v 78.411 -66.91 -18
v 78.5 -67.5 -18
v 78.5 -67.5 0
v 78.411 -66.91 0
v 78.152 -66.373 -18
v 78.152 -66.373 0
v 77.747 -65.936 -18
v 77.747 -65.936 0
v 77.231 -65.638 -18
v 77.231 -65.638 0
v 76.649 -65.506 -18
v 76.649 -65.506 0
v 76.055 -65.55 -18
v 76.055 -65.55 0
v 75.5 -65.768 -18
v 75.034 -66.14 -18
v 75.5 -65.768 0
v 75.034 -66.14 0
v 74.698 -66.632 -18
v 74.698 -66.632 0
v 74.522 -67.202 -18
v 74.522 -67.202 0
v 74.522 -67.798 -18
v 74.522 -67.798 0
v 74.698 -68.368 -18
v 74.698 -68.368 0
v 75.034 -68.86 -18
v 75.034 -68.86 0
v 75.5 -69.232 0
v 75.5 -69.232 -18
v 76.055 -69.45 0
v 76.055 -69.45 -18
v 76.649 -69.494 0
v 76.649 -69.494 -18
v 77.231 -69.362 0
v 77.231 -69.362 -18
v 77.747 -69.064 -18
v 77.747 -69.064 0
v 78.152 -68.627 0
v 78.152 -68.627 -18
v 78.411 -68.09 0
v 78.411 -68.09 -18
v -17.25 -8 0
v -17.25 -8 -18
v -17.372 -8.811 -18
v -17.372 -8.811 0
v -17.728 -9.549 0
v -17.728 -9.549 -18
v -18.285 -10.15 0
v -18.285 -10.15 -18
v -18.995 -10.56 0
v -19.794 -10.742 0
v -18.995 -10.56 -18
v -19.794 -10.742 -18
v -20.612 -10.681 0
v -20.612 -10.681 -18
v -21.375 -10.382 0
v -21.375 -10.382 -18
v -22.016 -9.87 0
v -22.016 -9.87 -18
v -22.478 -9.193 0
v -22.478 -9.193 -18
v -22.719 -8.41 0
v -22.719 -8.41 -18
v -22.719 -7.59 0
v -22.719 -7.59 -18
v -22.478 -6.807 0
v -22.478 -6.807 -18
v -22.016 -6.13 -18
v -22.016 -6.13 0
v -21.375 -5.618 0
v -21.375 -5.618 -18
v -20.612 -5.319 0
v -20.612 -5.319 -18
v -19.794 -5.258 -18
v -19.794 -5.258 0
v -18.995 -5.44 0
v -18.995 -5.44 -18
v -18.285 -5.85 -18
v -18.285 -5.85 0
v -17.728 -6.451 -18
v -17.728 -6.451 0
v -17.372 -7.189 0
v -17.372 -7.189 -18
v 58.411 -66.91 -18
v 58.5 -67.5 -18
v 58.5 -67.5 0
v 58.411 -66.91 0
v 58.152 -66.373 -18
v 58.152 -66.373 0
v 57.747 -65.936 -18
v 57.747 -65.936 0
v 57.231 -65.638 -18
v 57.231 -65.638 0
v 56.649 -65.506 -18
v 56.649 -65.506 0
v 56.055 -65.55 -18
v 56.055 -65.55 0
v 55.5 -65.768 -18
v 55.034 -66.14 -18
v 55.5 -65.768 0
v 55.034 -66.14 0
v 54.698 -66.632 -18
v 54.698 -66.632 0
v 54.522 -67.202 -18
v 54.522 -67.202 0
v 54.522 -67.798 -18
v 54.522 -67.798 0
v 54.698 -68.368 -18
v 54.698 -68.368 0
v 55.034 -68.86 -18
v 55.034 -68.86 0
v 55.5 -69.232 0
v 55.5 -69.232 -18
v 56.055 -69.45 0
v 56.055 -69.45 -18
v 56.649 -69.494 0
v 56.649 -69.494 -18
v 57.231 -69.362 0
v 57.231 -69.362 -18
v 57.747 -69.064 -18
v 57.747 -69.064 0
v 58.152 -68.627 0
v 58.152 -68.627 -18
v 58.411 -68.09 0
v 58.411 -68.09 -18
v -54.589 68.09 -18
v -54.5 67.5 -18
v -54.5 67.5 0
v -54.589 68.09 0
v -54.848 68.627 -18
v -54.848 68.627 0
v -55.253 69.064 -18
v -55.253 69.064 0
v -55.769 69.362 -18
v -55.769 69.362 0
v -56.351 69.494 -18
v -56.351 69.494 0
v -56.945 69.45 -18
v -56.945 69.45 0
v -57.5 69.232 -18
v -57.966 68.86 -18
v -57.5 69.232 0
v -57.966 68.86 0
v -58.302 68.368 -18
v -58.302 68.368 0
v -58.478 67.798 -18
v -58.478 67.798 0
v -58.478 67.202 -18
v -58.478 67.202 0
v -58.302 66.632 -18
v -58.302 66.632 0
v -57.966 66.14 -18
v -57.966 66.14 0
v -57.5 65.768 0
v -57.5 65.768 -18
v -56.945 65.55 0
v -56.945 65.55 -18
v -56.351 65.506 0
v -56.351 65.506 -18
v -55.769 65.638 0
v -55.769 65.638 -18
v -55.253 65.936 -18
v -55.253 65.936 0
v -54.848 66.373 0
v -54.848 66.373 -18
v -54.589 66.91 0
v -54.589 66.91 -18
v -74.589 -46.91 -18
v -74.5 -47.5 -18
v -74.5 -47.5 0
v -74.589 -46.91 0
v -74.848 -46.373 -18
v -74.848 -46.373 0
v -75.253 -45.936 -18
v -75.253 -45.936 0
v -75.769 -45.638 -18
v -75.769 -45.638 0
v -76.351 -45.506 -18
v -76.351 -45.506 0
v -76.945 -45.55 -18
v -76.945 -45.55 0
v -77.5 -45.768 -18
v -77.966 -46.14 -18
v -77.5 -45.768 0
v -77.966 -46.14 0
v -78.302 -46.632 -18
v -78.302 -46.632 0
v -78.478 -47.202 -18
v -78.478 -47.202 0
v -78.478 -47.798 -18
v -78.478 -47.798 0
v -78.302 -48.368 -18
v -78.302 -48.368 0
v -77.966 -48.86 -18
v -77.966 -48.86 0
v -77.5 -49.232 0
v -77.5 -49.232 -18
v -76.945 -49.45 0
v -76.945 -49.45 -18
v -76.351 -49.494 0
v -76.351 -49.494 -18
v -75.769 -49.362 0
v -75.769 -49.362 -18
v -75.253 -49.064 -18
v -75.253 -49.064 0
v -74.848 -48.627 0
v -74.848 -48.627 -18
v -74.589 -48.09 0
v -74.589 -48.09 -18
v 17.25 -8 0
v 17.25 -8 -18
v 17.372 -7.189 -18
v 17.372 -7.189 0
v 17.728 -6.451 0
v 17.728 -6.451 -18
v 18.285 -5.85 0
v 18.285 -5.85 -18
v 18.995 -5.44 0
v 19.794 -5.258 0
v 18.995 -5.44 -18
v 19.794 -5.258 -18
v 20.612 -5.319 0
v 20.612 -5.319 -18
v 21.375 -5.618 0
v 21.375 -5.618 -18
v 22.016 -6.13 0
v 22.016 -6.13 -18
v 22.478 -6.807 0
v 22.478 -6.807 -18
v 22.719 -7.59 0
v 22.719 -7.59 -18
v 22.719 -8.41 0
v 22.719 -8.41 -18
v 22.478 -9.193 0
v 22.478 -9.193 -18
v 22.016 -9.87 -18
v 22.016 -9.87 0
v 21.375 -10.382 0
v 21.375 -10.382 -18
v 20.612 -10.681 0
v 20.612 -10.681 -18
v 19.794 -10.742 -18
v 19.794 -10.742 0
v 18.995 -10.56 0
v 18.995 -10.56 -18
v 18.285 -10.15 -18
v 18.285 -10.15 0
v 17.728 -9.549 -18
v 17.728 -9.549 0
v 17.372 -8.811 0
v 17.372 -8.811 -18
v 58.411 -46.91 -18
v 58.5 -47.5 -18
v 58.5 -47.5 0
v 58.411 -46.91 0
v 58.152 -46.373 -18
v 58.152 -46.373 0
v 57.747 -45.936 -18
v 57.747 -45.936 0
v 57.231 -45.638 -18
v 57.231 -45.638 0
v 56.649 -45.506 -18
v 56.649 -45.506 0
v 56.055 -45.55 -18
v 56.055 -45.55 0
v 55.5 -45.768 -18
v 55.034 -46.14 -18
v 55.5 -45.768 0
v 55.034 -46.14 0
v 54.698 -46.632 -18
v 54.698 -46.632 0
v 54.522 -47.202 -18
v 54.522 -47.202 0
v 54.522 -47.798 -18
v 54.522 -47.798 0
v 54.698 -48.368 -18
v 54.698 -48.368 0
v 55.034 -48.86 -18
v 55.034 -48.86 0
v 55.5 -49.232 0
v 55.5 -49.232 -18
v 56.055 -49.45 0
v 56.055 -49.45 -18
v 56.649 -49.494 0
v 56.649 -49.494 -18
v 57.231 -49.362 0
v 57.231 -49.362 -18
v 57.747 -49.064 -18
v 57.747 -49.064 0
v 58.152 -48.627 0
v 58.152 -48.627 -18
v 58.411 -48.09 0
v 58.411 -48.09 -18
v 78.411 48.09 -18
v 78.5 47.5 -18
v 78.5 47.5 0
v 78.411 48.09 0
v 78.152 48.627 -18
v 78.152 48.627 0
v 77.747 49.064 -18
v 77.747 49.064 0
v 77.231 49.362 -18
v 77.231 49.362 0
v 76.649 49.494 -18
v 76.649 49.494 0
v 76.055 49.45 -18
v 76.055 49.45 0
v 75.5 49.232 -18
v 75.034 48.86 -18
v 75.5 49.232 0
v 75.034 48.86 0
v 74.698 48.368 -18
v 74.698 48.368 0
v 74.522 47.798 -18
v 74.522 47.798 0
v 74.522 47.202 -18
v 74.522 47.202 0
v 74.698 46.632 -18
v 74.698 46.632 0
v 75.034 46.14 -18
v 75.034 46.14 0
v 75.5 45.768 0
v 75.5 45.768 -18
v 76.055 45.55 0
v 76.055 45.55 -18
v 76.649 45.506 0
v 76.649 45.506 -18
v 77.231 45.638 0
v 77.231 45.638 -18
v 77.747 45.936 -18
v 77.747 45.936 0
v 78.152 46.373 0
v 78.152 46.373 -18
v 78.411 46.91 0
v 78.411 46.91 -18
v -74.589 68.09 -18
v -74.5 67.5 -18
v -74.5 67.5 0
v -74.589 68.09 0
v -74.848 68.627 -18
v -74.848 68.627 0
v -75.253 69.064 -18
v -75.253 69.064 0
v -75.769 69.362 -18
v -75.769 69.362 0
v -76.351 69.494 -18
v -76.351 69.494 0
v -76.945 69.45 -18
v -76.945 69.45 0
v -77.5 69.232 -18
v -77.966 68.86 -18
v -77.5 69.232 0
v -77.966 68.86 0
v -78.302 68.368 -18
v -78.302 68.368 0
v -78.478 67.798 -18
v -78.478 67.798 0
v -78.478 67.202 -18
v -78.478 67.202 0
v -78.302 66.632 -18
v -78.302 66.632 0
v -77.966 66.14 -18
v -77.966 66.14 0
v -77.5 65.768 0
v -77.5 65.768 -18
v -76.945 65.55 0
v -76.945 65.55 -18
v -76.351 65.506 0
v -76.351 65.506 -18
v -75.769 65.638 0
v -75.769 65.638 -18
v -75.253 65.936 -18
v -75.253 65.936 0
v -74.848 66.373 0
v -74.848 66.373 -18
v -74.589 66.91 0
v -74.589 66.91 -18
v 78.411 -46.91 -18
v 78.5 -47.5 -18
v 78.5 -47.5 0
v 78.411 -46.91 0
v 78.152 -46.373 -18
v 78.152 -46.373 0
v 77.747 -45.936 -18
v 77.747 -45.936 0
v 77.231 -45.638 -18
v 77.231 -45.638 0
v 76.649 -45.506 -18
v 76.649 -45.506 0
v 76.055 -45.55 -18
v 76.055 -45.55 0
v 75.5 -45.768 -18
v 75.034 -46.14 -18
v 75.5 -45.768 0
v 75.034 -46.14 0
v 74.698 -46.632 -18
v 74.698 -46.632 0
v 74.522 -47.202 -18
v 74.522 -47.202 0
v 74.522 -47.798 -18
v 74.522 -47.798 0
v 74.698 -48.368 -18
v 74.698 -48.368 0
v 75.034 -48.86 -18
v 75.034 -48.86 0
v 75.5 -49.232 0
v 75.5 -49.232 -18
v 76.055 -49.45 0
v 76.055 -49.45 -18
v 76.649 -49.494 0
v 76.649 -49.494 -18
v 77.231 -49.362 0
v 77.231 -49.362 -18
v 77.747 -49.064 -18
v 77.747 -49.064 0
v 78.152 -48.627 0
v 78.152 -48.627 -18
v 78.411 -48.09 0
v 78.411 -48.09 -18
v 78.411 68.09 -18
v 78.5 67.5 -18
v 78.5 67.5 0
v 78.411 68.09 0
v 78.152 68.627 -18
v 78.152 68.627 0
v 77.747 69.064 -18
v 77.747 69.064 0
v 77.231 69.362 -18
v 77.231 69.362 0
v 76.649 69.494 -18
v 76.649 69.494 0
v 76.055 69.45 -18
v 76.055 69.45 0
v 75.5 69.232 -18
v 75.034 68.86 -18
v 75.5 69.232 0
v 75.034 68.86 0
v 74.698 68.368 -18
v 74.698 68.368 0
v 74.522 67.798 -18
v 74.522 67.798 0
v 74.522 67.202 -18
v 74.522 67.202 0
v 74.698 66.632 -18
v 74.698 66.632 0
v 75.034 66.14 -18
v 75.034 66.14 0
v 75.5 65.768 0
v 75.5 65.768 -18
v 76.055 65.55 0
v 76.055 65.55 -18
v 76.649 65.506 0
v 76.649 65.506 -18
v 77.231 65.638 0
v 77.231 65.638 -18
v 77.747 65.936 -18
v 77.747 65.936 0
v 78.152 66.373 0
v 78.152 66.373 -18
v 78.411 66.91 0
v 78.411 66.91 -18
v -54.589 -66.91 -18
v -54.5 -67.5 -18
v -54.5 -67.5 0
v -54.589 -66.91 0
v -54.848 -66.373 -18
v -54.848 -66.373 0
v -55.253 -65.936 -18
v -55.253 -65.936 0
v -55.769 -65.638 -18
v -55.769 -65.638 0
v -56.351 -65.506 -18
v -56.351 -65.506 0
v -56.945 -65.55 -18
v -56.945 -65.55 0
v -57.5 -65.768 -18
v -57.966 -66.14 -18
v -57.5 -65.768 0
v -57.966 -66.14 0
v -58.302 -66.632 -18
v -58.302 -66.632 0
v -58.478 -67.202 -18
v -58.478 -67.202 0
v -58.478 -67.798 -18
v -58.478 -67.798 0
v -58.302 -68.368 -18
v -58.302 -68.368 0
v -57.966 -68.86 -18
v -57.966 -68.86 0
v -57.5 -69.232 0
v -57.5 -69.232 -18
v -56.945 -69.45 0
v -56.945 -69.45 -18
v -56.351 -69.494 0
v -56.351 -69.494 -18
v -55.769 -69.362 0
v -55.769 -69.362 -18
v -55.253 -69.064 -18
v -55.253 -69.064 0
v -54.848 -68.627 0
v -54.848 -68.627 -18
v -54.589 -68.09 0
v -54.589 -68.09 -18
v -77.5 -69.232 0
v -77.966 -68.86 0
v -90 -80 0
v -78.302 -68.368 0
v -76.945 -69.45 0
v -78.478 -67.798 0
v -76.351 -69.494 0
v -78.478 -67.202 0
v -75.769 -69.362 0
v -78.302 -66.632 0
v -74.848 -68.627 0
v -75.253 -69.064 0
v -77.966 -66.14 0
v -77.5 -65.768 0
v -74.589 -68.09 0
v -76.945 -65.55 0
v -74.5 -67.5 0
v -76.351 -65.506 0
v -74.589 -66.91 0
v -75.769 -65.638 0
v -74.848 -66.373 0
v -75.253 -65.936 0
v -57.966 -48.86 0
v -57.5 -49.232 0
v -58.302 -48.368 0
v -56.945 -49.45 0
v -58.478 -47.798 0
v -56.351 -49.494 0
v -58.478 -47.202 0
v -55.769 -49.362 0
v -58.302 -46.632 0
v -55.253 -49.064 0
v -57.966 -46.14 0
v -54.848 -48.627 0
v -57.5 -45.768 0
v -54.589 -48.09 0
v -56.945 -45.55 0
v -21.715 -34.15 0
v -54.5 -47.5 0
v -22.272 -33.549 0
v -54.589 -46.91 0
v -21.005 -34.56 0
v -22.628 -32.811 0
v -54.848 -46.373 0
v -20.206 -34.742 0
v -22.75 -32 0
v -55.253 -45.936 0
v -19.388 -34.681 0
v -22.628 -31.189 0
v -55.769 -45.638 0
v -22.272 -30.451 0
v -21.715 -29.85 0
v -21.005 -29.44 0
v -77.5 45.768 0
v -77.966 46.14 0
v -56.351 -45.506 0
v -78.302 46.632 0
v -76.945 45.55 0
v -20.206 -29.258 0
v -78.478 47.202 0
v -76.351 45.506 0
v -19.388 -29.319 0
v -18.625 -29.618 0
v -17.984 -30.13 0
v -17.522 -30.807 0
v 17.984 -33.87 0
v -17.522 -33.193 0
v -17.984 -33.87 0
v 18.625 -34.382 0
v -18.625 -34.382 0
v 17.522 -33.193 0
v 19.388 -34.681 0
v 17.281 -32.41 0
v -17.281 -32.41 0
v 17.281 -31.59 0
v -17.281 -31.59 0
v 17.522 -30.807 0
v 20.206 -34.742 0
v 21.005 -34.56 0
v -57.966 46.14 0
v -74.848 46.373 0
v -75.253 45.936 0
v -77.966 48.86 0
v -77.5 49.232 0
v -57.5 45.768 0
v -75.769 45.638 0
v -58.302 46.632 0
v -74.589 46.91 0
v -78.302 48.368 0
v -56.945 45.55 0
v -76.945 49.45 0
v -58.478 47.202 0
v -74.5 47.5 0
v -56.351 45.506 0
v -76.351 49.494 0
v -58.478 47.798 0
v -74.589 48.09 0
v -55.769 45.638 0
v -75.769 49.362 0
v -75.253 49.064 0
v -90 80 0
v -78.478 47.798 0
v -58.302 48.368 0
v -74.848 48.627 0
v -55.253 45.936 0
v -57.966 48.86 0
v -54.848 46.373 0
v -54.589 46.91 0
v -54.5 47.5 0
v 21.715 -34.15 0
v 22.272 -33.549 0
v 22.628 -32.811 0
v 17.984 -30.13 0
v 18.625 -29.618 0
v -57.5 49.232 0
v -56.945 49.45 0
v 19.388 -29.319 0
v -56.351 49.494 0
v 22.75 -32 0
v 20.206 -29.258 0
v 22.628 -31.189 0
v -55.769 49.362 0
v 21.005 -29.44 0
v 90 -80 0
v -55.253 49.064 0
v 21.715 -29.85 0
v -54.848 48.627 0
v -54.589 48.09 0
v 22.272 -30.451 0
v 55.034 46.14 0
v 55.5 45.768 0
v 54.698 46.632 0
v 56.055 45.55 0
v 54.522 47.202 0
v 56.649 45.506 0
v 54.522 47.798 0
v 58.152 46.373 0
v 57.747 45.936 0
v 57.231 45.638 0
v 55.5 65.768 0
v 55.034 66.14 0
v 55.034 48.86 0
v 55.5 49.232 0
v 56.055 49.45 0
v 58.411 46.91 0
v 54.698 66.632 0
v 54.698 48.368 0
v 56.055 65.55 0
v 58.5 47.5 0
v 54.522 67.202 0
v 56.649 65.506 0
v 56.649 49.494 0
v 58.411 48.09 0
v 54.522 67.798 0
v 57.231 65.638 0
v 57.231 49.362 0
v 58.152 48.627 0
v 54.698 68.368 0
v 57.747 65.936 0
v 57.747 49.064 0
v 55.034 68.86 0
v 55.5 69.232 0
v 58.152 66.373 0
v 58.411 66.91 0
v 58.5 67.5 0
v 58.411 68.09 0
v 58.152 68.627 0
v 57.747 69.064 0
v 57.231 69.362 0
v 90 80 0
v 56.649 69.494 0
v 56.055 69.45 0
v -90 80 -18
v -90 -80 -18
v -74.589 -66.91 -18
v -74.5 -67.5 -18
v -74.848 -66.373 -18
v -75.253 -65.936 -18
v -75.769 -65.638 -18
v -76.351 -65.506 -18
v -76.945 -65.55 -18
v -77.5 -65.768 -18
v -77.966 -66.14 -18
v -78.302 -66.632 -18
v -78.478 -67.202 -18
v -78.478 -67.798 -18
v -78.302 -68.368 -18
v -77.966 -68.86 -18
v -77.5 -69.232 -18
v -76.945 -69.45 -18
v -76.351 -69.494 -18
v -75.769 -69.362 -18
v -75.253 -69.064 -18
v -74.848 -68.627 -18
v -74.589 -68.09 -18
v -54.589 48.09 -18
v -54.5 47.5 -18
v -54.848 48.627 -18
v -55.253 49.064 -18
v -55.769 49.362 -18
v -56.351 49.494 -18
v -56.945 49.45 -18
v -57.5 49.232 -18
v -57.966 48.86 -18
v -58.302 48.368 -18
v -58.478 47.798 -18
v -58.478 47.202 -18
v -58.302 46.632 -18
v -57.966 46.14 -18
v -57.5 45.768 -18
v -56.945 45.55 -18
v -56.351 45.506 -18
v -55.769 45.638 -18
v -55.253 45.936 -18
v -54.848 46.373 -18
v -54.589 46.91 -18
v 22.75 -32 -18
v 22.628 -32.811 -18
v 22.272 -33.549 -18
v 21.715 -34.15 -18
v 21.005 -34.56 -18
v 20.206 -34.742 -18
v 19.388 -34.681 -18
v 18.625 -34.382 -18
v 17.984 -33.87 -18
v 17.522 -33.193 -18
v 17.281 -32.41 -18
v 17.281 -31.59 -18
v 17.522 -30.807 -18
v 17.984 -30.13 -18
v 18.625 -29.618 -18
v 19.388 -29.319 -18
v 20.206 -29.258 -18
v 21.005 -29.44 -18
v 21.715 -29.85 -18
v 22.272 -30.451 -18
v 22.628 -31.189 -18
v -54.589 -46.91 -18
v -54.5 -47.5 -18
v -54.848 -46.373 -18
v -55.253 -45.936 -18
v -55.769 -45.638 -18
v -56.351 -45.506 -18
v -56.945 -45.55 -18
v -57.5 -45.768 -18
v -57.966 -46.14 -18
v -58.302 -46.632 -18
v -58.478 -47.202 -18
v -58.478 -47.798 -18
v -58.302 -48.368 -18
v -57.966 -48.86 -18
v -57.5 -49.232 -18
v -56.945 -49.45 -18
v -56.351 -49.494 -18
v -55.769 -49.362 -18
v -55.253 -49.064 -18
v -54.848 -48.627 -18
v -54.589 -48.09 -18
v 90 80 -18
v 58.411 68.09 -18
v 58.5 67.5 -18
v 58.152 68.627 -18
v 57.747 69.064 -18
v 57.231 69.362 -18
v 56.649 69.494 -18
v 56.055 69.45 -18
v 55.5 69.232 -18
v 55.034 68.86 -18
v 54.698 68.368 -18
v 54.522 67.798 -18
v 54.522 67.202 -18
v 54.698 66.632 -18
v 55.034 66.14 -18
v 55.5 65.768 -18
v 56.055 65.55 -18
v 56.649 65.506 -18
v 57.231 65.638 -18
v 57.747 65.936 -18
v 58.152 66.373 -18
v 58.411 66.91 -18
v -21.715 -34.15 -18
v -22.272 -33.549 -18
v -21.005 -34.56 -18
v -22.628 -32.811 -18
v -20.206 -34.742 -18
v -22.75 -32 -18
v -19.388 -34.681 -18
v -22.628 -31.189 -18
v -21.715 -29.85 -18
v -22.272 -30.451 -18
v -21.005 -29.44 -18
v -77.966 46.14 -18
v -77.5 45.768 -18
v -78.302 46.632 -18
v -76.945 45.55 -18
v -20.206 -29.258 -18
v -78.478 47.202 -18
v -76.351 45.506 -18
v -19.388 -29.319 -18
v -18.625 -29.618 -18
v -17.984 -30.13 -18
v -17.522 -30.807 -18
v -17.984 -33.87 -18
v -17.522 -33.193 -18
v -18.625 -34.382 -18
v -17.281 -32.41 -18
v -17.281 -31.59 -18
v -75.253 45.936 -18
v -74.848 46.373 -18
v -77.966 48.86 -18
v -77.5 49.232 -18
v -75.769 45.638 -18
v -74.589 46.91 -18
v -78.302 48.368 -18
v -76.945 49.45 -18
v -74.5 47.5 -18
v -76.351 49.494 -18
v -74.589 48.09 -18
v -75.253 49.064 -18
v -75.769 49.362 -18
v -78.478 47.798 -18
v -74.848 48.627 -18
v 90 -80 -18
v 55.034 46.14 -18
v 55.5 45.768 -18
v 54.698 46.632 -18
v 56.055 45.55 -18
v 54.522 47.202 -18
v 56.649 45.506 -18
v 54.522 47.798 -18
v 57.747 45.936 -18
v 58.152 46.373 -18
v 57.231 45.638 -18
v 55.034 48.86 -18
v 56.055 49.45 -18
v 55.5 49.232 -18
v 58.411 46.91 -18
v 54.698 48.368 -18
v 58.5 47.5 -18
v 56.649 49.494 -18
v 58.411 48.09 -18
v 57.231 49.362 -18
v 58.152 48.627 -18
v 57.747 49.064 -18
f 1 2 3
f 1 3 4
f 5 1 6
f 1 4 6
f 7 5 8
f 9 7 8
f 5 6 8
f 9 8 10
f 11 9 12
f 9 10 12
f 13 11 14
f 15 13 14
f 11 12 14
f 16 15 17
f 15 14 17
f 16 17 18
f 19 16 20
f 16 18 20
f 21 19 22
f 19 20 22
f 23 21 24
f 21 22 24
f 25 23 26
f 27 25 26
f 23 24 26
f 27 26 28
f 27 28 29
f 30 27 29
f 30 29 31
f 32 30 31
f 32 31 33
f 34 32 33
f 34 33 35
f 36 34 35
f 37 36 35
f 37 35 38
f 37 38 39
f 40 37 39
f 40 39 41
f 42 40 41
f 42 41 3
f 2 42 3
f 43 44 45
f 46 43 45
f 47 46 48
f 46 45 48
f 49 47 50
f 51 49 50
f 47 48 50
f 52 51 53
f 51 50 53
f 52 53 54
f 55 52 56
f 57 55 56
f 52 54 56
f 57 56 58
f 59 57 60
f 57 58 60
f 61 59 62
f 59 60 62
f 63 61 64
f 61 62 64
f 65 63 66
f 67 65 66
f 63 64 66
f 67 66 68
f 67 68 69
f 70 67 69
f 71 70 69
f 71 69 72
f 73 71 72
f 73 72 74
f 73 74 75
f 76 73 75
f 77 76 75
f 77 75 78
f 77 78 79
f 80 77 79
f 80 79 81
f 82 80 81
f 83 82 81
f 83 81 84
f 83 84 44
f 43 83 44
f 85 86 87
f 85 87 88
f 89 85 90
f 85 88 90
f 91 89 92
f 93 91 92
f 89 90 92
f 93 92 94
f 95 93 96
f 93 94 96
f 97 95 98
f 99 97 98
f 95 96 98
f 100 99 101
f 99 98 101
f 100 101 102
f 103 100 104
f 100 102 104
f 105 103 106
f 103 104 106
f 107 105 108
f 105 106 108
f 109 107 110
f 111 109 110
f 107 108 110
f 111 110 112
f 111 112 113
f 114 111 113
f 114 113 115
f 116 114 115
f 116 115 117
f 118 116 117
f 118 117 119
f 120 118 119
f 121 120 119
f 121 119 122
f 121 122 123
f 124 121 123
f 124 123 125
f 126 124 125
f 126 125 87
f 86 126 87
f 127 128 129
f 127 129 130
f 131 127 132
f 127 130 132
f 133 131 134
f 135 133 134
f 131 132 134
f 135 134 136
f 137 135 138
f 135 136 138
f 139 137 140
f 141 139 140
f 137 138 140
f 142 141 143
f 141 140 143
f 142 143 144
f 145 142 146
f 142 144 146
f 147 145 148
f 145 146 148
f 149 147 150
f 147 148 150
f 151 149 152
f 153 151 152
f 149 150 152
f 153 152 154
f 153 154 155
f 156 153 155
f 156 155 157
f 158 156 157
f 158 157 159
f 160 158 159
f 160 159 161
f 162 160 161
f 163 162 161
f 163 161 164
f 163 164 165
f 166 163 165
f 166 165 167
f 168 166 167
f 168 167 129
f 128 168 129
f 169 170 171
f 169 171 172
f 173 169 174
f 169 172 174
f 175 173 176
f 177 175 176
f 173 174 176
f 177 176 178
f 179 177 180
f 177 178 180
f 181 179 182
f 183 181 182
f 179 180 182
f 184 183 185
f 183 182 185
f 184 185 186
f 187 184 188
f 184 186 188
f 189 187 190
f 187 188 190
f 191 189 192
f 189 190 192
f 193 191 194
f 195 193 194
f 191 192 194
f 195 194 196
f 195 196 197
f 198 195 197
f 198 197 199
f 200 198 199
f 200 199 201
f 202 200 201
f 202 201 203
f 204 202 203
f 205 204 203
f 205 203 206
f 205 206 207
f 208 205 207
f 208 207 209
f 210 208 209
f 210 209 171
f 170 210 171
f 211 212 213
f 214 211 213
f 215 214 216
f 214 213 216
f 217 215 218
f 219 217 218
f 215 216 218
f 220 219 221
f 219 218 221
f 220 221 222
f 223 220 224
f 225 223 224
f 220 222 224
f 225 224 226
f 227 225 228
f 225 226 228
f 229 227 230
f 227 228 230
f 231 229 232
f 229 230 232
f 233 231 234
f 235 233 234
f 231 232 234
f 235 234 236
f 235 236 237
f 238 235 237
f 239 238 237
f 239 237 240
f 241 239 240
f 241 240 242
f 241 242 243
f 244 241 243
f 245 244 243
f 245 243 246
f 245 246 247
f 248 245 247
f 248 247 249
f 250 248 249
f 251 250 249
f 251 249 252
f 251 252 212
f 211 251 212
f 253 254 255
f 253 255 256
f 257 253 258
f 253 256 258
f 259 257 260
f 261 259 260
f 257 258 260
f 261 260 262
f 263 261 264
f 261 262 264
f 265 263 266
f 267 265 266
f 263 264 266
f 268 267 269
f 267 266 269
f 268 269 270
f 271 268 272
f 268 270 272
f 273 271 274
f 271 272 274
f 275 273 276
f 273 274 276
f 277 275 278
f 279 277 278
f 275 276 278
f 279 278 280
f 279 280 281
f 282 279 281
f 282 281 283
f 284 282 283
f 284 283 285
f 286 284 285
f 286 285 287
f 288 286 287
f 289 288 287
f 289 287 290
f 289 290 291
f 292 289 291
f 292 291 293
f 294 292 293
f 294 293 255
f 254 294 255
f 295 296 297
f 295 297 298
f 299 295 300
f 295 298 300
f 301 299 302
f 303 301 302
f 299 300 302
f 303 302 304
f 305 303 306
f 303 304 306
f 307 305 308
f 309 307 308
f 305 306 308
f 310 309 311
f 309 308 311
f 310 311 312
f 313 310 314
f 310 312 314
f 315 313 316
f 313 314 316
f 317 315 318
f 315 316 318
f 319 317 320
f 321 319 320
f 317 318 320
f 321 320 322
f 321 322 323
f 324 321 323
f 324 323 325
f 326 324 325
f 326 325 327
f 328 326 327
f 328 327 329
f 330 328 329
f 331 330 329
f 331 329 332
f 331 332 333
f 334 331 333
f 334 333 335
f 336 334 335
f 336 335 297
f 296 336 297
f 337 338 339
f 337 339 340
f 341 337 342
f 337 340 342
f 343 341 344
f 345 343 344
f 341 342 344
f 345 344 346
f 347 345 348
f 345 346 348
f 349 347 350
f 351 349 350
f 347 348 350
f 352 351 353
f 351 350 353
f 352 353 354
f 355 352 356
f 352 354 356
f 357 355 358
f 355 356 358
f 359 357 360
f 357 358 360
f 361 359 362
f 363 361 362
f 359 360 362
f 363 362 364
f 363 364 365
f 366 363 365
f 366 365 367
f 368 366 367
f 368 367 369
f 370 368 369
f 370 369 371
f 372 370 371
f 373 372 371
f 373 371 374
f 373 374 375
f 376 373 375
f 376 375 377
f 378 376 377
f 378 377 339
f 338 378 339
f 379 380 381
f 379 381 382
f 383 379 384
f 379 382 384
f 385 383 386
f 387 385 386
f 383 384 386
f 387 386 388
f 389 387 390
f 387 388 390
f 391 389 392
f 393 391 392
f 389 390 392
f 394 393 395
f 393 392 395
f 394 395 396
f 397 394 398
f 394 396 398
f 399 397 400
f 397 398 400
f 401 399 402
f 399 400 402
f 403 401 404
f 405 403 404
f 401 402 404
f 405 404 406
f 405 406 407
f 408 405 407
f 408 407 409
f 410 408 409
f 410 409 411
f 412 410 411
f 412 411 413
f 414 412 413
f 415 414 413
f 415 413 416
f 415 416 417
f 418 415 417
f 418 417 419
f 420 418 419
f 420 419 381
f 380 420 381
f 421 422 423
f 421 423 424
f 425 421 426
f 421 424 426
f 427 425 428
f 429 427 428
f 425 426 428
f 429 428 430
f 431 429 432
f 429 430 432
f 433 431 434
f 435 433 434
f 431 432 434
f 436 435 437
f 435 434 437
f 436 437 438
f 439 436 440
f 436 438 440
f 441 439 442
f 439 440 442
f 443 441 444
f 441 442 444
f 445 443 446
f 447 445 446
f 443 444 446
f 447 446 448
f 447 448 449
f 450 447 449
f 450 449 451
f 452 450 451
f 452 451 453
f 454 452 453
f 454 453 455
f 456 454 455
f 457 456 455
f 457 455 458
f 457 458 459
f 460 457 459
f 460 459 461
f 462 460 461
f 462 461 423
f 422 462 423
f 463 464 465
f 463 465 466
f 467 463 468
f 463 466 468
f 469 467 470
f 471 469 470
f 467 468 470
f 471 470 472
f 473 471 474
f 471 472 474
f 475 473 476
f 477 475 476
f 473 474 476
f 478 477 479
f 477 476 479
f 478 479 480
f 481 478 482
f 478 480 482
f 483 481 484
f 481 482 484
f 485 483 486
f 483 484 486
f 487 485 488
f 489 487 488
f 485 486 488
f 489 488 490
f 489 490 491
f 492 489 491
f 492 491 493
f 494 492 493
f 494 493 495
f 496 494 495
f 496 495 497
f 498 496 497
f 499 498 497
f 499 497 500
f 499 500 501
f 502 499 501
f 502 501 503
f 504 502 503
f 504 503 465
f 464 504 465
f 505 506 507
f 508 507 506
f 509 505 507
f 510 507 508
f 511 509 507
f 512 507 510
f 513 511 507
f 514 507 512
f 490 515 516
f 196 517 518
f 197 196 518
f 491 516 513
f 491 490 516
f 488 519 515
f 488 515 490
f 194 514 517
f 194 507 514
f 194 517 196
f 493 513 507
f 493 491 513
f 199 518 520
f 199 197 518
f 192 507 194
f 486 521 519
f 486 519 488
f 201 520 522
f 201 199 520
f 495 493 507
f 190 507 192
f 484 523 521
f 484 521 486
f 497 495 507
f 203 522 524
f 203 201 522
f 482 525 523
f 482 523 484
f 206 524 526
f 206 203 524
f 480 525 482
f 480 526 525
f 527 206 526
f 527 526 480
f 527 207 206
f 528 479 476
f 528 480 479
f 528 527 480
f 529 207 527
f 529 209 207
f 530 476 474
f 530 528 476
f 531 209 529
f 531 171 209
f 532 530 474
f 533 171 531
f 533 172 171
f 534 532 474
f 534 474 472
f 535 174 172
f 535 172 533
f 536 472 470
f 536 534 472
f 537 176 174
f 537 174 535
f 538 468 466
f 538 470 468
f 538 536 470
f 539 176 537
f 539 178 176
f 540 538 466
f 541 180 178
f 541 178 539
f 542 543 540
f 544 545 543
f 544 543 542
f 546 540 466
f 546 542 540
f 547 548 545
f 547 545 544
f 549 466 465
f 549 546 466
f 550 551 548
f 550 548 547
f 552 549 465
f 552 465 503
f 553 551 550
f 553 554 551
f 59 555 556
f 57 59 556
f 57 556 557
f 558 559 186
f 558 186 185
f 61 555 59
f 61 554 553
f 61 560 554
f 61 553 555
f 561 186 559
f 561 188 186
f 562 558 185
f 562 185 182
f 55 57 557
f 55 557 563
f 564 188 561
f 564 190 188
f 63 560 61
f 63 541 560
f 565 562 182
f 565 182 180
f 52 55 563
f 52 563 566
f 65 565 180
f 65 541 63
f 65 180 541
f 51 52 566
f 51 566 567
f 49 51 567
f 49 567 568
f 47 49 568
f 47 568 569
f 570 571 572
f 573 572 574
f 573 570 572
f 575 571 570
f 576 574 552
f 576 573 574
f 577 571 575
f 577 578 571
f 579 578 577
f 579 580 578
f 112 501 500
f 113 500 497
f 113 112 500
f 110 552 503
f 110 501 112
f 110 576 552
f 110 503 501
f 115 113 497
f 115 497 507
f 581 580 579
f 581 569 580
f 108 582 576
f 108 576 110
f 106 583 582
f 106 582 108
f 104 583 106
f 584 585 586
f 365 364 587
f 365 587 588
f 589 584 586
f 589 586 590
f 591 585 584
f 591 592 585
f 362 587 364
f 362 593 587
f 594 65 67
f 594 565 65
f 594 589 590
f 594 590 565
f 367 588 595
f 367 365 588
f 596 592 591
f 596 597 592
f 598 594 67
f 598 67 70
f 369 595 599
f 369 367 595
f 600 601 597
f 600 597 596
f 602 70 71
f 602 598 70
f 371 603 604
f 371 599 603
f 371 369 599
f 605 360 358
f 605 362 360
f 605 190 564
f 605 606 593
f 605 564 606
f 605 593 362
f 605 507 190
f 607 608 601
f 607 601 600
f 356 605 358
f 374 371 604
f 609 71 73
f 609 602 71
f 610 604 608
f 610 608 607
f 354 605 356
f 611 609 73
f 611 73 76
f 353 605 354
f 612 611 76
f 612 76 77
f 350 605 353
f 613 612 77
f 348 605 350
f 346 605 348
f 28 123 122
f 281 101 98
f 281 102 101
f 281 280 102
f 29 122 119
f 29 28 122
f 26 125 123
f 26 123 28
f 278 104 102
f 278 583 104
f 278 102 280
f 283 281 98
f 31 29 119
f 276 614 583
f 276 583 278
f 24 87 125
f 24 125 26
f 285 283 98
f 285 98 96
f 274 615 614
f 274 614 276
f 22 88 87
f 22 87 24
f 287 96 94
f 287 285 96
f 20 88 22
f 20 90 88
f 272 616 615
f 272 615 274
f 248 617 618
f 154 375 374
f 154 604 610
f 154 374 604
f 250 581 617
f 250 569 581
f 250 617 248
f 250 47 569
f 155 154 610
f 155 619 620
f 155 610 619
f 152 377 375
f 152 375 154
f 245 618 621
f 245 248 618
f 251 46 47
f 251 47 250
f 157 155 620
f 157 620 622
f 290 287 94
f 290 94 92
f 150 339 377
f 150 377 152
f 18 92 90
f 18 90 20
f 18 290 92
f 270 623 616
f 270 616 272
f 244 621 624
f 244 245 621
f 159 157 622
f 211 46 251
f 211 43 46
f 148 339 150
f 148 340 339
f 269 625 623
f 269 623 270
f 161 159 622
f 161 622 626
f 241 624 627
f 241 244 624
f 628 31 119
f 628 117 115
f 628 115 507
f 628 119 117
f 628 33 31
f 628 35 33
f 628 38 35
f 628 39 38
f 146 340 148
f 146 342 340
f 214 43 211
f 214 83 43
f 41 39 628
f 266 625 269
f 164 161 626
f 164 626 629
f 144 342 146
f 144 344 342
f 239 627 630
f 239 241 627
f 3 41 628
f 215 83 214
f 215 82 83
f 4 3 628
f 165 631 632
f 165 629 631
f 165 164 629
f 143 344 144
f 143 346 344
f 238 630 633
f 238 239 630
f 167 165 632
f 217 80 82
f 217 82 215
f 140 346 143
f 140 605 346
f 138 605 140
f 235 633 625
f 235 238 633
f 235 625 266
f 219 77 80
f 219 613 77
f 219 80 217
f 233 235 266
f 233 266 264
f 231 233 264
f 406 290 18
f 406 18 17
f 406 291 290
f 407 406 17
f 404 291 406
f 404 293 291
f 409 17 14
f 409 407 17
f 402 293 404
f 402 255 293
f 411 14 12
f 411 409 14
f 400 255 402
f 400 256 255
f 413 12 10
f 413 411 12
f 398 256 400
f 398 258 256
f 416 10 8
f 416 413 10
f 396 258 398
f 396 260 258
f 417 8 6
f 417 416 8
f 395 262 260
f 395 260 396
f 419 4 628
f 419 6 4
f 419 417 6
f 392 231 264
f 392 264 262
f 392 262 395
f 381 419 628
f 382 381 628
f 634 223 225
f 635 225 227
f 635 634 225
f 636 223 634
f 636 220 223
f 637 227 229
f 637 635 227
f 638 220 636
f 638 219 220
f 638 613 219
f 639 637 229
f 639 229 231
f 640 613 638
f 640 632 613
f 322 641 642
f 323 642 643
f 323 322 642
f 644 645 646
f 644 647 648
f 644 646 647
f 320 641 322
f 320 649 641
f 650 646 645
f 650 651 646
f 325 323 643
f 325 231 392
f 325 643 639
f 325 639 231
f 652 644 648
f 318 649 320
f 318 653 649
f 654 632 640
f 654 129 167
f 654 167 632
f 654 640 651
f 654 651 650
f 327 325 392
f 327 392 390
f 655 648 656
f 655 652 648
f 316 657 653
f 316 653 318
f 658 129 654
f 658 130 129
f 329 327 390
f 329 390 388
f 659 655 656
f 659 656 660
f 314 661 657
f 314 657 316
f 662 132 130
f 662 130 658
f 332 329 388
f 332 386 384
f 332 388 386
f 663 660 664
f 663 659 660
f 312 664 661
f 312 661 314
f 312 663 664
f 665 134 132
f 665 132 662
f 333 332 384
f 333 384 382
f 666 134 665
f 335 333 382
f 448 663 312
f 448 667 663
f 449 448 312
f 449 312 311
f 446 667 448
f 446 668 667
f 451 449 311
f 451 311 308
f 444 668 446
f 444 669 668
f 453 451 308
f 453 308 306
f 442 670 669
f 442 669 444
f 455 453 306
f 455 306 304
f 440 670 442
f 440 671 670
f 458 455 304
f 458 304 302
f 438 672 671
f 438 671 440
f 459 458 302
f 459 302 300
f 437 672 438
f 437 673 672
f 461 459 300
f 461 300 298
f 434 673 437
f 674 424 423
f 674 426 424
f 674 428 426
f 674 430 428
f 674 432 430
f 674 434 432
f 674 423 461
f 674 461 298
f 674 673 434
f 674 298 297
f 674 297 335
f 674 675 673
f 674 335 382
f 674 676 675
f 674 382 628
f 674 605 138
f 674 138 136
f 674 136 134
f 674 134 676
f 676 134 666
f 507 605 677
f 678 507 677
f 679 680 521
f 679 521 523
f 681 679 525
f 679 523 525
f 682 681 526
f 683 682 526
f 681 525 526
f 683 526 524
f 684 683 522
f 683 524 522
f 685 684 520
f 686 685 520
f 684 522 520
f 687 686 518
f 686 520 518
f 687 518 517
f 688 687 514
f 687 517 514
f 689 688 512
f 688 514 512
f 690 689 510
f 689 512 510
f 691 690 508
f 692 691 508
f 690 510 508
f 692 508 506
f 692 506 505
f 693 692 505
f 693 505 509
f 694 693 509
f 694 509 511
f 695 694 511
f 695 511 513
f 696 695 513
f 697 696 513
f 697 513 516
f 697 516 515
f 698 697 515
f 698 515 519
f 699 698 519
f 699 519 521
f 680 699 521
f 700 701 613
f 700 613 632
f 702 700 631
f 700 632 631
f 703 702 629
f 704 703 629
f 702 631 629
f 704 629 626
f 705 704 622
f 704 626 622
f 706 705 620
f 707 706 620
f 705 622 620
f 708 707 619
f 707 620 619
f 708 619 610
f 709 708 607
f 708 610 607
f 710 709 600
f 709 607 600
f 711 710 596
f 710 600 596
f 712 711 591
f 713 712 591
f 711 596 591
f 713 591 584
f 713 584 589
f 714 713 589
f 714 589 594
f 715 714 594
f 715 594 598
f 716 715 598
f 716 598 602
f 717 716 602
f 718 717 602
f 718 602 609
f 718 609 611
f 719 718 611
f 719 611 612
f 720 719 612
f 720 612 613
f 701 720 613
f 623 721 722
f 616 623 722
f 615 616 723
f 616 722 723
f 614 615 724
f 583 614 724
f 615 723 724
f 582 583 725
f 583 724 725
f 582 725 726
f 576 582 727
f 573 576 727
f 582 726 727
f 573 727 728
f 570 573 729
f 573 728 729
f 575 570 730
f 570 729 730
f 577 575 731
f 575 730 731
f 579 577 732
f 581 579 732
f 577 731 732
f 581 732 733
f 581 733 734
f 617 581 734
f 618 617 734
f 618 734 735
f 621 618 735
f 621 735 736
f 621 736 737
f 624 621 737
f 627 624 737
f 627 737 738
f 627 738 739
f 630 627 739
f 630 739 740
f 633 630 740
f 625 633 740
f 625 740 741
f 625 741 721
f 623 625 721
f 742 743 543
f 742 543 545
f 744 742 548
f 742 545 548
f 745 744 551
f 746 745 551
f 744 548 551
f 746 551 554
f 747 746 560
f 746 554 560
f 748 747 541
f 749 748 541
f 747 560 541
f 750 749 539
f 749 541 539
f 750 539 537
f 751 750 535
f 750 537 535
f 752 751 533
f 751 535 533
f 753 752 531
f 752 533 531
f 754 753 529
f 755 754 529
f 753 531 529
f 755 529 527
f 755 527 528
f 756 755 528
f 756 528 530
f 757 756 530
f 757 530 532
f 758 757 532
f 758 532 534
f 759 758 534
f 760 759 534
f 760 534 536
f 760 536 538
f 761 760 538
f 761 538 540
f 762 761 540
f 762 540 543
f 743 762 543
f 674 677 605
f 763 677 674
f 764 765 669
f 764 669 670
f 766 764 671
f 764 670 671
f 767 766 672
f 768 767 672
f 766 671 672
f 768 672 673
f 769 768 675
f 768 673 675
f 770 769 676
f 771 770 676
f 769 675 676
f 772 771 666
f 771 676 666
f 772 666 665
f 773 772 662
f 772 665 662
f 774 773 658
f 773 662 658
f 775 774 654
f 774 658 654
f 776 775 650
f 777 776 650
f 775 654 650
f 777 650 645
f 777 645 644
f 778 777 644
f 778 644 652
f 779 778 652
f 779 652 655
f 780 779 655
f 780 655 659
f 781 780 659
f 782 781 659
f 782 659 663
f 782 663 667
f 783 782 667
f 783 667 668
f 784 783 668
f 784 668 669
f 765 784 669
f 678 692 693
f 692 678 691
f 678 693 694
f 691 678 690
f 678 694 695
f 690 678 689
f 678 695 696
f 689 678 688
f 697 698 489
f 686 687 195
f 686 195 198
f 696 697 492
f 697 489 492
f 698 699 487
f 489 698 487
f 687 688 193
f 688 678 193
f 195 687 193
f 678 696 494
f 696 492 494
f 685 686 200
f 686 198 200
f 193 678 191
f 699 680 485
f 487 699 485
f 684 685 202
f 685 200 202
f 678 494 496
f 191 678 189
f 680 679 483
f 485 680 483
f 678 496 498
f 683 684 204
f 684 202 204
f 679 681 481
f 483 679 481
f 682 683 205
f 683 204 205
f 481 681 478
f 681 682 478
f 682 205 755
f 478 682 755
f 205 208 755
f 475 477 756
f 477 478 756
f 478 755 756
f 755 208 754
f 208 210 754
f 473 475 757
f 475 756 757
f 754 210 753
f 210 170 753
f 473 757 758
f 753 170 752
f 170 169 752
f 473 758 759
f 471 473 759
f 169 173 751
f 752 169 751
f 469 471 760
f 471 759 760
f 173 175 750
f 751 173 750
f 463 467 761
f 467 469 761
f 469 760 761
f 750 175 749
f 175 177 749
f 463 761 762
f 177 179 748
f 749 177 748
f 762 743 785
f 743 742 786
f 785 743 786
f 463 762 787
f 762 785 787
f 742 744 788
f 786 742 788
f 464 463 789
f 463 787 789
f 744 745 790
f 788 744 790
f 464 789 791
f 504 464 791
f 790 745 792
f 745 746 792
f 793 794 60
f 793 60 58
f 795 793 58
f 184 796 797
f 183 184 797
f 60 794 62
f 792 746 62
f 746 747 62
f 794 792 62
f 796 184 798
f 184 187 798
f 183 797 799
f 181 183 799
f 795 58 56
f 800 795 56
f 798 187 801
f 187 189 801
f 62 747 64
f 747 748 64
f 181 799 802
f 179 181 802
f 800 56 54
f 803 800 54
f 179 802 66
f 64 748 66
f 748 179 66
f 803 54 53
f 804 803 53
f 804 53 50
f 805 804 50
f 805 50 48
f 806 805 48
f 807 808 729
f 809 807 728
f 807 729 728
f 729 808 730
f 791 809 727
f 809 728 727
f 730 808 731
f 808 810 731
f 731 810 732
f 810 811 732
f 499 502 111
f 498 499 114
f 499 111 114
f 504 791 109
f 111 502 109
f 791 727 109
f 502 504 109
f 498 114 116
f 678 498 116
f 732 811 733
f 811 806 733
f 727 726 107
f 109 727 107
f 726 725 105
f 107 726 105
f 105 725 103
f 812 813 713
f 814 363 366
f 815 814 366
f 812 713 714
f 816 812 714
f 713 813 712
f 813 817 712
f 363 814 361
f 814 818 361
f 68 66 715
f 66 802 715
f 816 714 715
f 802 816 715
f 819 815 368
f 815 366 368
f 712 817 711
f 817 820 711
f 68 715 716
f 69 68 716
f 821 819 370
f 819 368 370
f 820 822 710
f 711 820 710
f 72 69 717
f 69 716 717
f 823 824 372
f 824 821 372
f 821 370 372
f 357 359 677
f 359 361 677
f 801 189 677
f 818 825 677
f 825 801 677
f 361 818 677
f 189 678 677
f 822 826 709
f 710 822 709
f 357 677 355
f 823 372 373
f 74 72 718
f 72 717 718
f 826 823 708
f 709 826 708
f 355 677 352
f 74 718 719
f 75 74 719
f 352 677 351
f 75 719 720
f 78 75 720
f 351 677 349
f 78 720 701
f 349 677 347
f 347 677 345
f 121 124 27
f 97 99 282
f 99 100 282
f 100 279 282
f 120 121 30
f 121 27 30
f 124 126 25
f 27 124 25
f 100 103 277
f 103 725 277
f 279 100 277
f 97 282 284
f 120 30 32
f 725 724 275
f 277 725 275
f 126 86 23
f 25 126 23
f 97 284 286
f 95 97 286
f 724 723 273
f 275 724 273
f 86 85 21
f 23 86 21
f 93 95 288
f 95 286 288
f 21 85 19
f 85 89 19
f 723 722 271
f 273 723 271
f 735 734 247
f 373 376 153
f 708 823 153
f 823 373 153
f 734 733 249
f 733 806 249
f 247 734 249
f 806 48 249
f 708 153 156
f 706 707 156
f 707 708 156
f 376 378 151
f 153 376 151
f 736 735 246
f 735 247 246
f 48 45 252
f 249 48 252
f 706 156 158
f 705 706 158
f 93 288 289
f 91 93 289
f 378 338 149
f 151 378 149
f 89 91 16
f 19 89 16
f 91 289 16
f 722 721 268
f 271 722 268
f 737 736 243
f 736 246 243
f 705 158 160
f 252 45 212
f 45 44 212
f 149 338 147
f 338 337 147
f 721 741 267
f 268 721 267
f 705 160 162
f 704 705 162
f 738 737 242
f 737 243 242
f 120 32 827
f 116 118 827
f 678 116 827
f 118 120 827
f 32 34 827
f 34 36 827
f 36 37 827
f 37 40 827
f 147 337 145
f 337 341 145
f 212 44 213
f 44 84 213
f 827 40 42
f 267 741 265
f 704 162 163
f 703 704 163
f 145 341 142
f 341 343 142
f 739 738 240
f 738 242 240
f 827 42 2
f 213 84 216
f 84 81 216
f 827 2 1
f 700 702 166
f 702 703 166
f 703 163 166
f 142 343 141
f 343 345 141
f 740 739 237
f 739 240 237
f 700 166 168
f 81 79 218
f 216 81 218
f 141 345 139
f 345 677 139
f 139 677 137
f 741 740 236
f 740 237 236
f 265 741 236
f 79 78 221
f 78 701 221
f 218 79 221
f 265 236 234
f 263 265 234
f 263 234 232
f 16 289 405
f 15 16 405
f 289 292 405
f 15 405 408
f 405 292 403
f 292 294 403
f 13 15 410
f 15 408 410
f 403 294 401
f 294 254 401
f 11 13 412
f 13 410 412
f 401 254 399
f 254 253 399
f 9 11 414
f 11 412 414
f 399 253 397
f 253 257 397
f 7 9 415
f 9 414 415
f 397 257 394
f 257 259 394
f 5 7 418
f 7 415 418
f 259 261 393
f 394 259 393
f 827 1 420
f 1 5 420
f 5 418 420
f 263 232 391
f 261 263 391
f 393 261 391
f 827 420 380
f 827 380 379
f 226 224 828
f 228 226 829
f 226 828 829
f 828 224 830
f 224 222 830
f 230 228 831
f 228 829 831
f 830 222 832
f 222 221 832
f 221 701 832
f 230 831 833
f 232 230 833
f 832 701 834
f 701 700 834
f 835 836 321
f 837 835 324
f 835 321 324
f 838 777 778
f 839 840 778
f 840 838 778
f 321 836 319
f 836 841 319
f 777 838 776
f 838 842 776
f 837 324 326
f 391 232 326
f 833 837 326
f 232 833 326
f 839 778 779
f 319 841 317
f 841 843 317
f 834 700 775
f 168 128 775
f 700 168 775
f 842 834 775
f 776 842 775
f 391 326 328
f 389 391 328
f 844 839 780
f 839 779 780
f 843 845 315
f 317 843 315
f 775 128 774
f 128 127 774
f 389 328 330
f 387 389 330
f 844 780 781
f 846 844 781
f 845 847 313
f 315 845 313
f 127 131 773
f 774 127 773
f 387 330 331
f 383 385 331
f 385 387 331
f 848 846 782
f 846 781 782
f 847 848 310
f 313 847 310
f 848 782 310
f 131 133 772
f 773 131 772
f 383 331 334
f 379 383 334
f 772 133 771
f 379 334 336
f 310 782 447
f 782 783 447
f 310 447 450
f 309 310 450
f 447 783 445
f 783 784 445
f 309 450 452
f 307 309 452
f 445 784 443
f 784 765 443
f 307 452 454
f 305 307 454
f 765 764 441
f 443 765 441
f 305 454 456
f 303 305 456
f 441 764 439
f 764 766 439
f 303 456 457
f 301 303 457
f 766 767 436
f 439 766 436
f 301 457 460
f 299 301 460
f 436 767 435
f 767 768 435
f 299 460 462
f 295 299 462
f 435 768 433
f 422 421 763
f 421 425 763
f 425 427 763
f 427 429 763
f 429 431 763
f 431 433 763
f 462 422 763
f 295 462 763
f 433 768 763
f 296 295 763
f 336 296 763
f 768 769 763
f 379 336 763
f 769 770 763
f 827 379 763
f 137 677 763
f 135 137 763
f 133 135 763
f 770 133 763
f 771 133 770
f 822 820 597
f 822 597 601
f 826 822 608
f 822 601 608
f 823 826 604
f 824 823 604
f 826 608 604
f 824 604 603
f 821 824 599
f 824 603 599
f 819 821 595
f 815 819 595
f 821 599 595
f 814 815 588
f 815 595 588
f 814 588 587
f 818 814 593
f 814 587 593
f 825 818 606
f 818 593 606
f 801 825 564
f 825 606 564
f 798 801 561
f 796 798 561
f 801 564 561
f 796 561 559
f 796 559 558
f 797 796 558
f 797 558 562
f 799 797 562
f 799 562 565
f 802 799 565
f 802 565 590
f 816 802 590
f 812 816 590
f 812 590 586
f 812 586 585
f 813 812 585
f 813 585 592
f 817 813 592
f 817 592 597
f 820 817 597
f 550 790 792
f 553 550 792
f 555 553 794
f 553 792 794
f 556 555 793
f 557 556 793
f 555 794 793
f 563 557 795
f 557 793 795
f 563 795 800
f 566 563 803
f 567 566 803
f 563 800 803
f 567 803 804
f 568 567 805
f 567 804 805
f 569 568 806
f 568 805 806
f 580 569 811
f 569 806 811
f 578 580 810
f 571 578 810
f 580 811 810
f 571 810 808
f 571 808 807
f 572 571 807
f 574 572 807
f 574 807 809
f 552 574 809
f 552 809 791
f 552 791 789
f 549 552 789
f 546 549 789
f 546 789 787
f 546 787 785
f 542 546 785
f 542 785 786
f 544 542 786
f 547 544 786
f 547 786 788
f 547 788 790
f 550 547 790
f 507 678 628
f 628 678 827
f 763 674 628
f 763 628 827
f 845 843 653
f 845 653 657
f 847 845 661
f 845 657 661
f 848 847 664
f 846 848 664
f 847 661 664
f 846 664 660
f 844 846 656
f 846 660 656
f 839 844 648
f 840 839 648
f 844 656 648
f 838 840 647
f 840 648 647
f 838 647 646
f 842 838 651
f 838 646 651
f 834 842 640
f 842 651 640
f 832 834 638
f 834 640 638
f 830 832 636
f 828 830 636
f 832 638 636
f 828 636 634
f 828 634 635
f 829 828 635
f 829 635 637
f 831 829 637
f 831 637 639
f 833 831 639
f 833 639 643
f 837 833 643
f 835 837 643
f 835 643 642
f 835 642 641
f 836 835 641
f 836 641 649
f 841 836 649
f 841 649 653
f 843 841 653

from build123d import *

# Parameters (mm, degrees)
SKETCH1_W           = 160
SKETCH1_H           = 160
BOSS_EXTRUDE1_DEPTH = 18
SKETCH3_R           = 2
CUT_EXTRUDE1_DEPTH  = 115.560027933
SKETCH4_W           = 10
SKETCH4_H           = 18
BOSS_EXTRUDE3_DEPTH = 160
SKETCH7_R           = 2.75
CUT_EXTRUDE4_DEPTH  = 122.753850042


with BuildPart() as part:
    # Sketch1 → Boss-Extrude1 (new body)
    with BuildSketch(Plane.XY):
        Rectangle(SKETCH1_W, SKETCH1_H)
    extrude(amount=-BOSS_EXTRUDE1_DEPTH)

    # Sketch3 → Cut-Extrude1 (cut, through all)
    with BuildSketch(Plane.XY):
        with Locations((-76.5, 67.5)):
            Circle(SKETCH3_R)
        with Locations((-56.5, 67.5)):
            Circle(SKETCH3_R)
        with Locations((-56.5, 47.5)):
            Circle(SKETCH3_R)
        with Locations((-76.5, 47.5)):
            Circle(SKETCH3_R)
        with Locations((76.5, 67.5)):
            Circle(SKETCH3_R)
        with Locations((76.5, 47.5)):
            Circle(SKETCH3_R)
        with Locations((76.5, -47.5)):
            Circle(SKETCH3_R)
        with Locations((76.5, -67.5)):
            Circle(SKETCH3_R)
        with Locations((56.5, -47.5)):
            Circle(SKETCH3_R)
        with Locations((56.5, -67.5)):
            Circle(SKETCH3_R)
        with Locations((-56.5, -47.5)):
            Circle(SKETCH3_R)
        with Locations((-56.5, -67.5)):
            Circle(SKETCH3_R)
        with Locations((-76.5, -47.5)):
            Circle(SKETCH3_R)
        with Locations((-76.5, -67.5)):
            Circle(SKETCH3_R)
        with Locations((56.5, 67.5)):
            Circle(SKETCH3_R)
        with Locations((56.5, 47.5)):
            Circle(SKETCH3_R)
    extrude(amount=-CUT_EXTRUDE1_DEPTH, mode=Mode.SUBTRACT)

    # Sketch4 → Boss-Extrude3 (add)
    with BuildSketch(Plane(origin=(0, 80, 0), x_dir=(1, 0, 0), z_dir=(0, 1, 0))):
        with Locations((85, 9)):
            Rectangle(SKETCH4_W, SKETCH4_H)
        with Locations((-85, 9)):
            Rectangle(SKETCH4_W, SKETCH4_H)
    extrude(amount=-BOSS_EXTRUDE3_DEPTH)

    # Sketch7 → Cut-Extrude4 (cut, through all)
    with BuildSketch(Plane(origin=(0, 0, -18), x_dir=(-1, 0, 0), z_dir=(0, 0, -1))):
        with Locations((-20, -8)):
            Circle(SKETCH7_R)
        with Locations(Location((-20, -32, 0), (0, 0, 180))):
            Circle(SKETCH7_R)
        with Locations((20, -32)):
            Circle(SKETCH7_R)
        with Locations(Location((20, -8, 0), (0, 0, 180))):
            Circle(SKETCH7_R)
    extrude(amount=-CUT_EXTRUDE4_DEPTH, mode=Mode.SUBTRACT)


solid = part.part
